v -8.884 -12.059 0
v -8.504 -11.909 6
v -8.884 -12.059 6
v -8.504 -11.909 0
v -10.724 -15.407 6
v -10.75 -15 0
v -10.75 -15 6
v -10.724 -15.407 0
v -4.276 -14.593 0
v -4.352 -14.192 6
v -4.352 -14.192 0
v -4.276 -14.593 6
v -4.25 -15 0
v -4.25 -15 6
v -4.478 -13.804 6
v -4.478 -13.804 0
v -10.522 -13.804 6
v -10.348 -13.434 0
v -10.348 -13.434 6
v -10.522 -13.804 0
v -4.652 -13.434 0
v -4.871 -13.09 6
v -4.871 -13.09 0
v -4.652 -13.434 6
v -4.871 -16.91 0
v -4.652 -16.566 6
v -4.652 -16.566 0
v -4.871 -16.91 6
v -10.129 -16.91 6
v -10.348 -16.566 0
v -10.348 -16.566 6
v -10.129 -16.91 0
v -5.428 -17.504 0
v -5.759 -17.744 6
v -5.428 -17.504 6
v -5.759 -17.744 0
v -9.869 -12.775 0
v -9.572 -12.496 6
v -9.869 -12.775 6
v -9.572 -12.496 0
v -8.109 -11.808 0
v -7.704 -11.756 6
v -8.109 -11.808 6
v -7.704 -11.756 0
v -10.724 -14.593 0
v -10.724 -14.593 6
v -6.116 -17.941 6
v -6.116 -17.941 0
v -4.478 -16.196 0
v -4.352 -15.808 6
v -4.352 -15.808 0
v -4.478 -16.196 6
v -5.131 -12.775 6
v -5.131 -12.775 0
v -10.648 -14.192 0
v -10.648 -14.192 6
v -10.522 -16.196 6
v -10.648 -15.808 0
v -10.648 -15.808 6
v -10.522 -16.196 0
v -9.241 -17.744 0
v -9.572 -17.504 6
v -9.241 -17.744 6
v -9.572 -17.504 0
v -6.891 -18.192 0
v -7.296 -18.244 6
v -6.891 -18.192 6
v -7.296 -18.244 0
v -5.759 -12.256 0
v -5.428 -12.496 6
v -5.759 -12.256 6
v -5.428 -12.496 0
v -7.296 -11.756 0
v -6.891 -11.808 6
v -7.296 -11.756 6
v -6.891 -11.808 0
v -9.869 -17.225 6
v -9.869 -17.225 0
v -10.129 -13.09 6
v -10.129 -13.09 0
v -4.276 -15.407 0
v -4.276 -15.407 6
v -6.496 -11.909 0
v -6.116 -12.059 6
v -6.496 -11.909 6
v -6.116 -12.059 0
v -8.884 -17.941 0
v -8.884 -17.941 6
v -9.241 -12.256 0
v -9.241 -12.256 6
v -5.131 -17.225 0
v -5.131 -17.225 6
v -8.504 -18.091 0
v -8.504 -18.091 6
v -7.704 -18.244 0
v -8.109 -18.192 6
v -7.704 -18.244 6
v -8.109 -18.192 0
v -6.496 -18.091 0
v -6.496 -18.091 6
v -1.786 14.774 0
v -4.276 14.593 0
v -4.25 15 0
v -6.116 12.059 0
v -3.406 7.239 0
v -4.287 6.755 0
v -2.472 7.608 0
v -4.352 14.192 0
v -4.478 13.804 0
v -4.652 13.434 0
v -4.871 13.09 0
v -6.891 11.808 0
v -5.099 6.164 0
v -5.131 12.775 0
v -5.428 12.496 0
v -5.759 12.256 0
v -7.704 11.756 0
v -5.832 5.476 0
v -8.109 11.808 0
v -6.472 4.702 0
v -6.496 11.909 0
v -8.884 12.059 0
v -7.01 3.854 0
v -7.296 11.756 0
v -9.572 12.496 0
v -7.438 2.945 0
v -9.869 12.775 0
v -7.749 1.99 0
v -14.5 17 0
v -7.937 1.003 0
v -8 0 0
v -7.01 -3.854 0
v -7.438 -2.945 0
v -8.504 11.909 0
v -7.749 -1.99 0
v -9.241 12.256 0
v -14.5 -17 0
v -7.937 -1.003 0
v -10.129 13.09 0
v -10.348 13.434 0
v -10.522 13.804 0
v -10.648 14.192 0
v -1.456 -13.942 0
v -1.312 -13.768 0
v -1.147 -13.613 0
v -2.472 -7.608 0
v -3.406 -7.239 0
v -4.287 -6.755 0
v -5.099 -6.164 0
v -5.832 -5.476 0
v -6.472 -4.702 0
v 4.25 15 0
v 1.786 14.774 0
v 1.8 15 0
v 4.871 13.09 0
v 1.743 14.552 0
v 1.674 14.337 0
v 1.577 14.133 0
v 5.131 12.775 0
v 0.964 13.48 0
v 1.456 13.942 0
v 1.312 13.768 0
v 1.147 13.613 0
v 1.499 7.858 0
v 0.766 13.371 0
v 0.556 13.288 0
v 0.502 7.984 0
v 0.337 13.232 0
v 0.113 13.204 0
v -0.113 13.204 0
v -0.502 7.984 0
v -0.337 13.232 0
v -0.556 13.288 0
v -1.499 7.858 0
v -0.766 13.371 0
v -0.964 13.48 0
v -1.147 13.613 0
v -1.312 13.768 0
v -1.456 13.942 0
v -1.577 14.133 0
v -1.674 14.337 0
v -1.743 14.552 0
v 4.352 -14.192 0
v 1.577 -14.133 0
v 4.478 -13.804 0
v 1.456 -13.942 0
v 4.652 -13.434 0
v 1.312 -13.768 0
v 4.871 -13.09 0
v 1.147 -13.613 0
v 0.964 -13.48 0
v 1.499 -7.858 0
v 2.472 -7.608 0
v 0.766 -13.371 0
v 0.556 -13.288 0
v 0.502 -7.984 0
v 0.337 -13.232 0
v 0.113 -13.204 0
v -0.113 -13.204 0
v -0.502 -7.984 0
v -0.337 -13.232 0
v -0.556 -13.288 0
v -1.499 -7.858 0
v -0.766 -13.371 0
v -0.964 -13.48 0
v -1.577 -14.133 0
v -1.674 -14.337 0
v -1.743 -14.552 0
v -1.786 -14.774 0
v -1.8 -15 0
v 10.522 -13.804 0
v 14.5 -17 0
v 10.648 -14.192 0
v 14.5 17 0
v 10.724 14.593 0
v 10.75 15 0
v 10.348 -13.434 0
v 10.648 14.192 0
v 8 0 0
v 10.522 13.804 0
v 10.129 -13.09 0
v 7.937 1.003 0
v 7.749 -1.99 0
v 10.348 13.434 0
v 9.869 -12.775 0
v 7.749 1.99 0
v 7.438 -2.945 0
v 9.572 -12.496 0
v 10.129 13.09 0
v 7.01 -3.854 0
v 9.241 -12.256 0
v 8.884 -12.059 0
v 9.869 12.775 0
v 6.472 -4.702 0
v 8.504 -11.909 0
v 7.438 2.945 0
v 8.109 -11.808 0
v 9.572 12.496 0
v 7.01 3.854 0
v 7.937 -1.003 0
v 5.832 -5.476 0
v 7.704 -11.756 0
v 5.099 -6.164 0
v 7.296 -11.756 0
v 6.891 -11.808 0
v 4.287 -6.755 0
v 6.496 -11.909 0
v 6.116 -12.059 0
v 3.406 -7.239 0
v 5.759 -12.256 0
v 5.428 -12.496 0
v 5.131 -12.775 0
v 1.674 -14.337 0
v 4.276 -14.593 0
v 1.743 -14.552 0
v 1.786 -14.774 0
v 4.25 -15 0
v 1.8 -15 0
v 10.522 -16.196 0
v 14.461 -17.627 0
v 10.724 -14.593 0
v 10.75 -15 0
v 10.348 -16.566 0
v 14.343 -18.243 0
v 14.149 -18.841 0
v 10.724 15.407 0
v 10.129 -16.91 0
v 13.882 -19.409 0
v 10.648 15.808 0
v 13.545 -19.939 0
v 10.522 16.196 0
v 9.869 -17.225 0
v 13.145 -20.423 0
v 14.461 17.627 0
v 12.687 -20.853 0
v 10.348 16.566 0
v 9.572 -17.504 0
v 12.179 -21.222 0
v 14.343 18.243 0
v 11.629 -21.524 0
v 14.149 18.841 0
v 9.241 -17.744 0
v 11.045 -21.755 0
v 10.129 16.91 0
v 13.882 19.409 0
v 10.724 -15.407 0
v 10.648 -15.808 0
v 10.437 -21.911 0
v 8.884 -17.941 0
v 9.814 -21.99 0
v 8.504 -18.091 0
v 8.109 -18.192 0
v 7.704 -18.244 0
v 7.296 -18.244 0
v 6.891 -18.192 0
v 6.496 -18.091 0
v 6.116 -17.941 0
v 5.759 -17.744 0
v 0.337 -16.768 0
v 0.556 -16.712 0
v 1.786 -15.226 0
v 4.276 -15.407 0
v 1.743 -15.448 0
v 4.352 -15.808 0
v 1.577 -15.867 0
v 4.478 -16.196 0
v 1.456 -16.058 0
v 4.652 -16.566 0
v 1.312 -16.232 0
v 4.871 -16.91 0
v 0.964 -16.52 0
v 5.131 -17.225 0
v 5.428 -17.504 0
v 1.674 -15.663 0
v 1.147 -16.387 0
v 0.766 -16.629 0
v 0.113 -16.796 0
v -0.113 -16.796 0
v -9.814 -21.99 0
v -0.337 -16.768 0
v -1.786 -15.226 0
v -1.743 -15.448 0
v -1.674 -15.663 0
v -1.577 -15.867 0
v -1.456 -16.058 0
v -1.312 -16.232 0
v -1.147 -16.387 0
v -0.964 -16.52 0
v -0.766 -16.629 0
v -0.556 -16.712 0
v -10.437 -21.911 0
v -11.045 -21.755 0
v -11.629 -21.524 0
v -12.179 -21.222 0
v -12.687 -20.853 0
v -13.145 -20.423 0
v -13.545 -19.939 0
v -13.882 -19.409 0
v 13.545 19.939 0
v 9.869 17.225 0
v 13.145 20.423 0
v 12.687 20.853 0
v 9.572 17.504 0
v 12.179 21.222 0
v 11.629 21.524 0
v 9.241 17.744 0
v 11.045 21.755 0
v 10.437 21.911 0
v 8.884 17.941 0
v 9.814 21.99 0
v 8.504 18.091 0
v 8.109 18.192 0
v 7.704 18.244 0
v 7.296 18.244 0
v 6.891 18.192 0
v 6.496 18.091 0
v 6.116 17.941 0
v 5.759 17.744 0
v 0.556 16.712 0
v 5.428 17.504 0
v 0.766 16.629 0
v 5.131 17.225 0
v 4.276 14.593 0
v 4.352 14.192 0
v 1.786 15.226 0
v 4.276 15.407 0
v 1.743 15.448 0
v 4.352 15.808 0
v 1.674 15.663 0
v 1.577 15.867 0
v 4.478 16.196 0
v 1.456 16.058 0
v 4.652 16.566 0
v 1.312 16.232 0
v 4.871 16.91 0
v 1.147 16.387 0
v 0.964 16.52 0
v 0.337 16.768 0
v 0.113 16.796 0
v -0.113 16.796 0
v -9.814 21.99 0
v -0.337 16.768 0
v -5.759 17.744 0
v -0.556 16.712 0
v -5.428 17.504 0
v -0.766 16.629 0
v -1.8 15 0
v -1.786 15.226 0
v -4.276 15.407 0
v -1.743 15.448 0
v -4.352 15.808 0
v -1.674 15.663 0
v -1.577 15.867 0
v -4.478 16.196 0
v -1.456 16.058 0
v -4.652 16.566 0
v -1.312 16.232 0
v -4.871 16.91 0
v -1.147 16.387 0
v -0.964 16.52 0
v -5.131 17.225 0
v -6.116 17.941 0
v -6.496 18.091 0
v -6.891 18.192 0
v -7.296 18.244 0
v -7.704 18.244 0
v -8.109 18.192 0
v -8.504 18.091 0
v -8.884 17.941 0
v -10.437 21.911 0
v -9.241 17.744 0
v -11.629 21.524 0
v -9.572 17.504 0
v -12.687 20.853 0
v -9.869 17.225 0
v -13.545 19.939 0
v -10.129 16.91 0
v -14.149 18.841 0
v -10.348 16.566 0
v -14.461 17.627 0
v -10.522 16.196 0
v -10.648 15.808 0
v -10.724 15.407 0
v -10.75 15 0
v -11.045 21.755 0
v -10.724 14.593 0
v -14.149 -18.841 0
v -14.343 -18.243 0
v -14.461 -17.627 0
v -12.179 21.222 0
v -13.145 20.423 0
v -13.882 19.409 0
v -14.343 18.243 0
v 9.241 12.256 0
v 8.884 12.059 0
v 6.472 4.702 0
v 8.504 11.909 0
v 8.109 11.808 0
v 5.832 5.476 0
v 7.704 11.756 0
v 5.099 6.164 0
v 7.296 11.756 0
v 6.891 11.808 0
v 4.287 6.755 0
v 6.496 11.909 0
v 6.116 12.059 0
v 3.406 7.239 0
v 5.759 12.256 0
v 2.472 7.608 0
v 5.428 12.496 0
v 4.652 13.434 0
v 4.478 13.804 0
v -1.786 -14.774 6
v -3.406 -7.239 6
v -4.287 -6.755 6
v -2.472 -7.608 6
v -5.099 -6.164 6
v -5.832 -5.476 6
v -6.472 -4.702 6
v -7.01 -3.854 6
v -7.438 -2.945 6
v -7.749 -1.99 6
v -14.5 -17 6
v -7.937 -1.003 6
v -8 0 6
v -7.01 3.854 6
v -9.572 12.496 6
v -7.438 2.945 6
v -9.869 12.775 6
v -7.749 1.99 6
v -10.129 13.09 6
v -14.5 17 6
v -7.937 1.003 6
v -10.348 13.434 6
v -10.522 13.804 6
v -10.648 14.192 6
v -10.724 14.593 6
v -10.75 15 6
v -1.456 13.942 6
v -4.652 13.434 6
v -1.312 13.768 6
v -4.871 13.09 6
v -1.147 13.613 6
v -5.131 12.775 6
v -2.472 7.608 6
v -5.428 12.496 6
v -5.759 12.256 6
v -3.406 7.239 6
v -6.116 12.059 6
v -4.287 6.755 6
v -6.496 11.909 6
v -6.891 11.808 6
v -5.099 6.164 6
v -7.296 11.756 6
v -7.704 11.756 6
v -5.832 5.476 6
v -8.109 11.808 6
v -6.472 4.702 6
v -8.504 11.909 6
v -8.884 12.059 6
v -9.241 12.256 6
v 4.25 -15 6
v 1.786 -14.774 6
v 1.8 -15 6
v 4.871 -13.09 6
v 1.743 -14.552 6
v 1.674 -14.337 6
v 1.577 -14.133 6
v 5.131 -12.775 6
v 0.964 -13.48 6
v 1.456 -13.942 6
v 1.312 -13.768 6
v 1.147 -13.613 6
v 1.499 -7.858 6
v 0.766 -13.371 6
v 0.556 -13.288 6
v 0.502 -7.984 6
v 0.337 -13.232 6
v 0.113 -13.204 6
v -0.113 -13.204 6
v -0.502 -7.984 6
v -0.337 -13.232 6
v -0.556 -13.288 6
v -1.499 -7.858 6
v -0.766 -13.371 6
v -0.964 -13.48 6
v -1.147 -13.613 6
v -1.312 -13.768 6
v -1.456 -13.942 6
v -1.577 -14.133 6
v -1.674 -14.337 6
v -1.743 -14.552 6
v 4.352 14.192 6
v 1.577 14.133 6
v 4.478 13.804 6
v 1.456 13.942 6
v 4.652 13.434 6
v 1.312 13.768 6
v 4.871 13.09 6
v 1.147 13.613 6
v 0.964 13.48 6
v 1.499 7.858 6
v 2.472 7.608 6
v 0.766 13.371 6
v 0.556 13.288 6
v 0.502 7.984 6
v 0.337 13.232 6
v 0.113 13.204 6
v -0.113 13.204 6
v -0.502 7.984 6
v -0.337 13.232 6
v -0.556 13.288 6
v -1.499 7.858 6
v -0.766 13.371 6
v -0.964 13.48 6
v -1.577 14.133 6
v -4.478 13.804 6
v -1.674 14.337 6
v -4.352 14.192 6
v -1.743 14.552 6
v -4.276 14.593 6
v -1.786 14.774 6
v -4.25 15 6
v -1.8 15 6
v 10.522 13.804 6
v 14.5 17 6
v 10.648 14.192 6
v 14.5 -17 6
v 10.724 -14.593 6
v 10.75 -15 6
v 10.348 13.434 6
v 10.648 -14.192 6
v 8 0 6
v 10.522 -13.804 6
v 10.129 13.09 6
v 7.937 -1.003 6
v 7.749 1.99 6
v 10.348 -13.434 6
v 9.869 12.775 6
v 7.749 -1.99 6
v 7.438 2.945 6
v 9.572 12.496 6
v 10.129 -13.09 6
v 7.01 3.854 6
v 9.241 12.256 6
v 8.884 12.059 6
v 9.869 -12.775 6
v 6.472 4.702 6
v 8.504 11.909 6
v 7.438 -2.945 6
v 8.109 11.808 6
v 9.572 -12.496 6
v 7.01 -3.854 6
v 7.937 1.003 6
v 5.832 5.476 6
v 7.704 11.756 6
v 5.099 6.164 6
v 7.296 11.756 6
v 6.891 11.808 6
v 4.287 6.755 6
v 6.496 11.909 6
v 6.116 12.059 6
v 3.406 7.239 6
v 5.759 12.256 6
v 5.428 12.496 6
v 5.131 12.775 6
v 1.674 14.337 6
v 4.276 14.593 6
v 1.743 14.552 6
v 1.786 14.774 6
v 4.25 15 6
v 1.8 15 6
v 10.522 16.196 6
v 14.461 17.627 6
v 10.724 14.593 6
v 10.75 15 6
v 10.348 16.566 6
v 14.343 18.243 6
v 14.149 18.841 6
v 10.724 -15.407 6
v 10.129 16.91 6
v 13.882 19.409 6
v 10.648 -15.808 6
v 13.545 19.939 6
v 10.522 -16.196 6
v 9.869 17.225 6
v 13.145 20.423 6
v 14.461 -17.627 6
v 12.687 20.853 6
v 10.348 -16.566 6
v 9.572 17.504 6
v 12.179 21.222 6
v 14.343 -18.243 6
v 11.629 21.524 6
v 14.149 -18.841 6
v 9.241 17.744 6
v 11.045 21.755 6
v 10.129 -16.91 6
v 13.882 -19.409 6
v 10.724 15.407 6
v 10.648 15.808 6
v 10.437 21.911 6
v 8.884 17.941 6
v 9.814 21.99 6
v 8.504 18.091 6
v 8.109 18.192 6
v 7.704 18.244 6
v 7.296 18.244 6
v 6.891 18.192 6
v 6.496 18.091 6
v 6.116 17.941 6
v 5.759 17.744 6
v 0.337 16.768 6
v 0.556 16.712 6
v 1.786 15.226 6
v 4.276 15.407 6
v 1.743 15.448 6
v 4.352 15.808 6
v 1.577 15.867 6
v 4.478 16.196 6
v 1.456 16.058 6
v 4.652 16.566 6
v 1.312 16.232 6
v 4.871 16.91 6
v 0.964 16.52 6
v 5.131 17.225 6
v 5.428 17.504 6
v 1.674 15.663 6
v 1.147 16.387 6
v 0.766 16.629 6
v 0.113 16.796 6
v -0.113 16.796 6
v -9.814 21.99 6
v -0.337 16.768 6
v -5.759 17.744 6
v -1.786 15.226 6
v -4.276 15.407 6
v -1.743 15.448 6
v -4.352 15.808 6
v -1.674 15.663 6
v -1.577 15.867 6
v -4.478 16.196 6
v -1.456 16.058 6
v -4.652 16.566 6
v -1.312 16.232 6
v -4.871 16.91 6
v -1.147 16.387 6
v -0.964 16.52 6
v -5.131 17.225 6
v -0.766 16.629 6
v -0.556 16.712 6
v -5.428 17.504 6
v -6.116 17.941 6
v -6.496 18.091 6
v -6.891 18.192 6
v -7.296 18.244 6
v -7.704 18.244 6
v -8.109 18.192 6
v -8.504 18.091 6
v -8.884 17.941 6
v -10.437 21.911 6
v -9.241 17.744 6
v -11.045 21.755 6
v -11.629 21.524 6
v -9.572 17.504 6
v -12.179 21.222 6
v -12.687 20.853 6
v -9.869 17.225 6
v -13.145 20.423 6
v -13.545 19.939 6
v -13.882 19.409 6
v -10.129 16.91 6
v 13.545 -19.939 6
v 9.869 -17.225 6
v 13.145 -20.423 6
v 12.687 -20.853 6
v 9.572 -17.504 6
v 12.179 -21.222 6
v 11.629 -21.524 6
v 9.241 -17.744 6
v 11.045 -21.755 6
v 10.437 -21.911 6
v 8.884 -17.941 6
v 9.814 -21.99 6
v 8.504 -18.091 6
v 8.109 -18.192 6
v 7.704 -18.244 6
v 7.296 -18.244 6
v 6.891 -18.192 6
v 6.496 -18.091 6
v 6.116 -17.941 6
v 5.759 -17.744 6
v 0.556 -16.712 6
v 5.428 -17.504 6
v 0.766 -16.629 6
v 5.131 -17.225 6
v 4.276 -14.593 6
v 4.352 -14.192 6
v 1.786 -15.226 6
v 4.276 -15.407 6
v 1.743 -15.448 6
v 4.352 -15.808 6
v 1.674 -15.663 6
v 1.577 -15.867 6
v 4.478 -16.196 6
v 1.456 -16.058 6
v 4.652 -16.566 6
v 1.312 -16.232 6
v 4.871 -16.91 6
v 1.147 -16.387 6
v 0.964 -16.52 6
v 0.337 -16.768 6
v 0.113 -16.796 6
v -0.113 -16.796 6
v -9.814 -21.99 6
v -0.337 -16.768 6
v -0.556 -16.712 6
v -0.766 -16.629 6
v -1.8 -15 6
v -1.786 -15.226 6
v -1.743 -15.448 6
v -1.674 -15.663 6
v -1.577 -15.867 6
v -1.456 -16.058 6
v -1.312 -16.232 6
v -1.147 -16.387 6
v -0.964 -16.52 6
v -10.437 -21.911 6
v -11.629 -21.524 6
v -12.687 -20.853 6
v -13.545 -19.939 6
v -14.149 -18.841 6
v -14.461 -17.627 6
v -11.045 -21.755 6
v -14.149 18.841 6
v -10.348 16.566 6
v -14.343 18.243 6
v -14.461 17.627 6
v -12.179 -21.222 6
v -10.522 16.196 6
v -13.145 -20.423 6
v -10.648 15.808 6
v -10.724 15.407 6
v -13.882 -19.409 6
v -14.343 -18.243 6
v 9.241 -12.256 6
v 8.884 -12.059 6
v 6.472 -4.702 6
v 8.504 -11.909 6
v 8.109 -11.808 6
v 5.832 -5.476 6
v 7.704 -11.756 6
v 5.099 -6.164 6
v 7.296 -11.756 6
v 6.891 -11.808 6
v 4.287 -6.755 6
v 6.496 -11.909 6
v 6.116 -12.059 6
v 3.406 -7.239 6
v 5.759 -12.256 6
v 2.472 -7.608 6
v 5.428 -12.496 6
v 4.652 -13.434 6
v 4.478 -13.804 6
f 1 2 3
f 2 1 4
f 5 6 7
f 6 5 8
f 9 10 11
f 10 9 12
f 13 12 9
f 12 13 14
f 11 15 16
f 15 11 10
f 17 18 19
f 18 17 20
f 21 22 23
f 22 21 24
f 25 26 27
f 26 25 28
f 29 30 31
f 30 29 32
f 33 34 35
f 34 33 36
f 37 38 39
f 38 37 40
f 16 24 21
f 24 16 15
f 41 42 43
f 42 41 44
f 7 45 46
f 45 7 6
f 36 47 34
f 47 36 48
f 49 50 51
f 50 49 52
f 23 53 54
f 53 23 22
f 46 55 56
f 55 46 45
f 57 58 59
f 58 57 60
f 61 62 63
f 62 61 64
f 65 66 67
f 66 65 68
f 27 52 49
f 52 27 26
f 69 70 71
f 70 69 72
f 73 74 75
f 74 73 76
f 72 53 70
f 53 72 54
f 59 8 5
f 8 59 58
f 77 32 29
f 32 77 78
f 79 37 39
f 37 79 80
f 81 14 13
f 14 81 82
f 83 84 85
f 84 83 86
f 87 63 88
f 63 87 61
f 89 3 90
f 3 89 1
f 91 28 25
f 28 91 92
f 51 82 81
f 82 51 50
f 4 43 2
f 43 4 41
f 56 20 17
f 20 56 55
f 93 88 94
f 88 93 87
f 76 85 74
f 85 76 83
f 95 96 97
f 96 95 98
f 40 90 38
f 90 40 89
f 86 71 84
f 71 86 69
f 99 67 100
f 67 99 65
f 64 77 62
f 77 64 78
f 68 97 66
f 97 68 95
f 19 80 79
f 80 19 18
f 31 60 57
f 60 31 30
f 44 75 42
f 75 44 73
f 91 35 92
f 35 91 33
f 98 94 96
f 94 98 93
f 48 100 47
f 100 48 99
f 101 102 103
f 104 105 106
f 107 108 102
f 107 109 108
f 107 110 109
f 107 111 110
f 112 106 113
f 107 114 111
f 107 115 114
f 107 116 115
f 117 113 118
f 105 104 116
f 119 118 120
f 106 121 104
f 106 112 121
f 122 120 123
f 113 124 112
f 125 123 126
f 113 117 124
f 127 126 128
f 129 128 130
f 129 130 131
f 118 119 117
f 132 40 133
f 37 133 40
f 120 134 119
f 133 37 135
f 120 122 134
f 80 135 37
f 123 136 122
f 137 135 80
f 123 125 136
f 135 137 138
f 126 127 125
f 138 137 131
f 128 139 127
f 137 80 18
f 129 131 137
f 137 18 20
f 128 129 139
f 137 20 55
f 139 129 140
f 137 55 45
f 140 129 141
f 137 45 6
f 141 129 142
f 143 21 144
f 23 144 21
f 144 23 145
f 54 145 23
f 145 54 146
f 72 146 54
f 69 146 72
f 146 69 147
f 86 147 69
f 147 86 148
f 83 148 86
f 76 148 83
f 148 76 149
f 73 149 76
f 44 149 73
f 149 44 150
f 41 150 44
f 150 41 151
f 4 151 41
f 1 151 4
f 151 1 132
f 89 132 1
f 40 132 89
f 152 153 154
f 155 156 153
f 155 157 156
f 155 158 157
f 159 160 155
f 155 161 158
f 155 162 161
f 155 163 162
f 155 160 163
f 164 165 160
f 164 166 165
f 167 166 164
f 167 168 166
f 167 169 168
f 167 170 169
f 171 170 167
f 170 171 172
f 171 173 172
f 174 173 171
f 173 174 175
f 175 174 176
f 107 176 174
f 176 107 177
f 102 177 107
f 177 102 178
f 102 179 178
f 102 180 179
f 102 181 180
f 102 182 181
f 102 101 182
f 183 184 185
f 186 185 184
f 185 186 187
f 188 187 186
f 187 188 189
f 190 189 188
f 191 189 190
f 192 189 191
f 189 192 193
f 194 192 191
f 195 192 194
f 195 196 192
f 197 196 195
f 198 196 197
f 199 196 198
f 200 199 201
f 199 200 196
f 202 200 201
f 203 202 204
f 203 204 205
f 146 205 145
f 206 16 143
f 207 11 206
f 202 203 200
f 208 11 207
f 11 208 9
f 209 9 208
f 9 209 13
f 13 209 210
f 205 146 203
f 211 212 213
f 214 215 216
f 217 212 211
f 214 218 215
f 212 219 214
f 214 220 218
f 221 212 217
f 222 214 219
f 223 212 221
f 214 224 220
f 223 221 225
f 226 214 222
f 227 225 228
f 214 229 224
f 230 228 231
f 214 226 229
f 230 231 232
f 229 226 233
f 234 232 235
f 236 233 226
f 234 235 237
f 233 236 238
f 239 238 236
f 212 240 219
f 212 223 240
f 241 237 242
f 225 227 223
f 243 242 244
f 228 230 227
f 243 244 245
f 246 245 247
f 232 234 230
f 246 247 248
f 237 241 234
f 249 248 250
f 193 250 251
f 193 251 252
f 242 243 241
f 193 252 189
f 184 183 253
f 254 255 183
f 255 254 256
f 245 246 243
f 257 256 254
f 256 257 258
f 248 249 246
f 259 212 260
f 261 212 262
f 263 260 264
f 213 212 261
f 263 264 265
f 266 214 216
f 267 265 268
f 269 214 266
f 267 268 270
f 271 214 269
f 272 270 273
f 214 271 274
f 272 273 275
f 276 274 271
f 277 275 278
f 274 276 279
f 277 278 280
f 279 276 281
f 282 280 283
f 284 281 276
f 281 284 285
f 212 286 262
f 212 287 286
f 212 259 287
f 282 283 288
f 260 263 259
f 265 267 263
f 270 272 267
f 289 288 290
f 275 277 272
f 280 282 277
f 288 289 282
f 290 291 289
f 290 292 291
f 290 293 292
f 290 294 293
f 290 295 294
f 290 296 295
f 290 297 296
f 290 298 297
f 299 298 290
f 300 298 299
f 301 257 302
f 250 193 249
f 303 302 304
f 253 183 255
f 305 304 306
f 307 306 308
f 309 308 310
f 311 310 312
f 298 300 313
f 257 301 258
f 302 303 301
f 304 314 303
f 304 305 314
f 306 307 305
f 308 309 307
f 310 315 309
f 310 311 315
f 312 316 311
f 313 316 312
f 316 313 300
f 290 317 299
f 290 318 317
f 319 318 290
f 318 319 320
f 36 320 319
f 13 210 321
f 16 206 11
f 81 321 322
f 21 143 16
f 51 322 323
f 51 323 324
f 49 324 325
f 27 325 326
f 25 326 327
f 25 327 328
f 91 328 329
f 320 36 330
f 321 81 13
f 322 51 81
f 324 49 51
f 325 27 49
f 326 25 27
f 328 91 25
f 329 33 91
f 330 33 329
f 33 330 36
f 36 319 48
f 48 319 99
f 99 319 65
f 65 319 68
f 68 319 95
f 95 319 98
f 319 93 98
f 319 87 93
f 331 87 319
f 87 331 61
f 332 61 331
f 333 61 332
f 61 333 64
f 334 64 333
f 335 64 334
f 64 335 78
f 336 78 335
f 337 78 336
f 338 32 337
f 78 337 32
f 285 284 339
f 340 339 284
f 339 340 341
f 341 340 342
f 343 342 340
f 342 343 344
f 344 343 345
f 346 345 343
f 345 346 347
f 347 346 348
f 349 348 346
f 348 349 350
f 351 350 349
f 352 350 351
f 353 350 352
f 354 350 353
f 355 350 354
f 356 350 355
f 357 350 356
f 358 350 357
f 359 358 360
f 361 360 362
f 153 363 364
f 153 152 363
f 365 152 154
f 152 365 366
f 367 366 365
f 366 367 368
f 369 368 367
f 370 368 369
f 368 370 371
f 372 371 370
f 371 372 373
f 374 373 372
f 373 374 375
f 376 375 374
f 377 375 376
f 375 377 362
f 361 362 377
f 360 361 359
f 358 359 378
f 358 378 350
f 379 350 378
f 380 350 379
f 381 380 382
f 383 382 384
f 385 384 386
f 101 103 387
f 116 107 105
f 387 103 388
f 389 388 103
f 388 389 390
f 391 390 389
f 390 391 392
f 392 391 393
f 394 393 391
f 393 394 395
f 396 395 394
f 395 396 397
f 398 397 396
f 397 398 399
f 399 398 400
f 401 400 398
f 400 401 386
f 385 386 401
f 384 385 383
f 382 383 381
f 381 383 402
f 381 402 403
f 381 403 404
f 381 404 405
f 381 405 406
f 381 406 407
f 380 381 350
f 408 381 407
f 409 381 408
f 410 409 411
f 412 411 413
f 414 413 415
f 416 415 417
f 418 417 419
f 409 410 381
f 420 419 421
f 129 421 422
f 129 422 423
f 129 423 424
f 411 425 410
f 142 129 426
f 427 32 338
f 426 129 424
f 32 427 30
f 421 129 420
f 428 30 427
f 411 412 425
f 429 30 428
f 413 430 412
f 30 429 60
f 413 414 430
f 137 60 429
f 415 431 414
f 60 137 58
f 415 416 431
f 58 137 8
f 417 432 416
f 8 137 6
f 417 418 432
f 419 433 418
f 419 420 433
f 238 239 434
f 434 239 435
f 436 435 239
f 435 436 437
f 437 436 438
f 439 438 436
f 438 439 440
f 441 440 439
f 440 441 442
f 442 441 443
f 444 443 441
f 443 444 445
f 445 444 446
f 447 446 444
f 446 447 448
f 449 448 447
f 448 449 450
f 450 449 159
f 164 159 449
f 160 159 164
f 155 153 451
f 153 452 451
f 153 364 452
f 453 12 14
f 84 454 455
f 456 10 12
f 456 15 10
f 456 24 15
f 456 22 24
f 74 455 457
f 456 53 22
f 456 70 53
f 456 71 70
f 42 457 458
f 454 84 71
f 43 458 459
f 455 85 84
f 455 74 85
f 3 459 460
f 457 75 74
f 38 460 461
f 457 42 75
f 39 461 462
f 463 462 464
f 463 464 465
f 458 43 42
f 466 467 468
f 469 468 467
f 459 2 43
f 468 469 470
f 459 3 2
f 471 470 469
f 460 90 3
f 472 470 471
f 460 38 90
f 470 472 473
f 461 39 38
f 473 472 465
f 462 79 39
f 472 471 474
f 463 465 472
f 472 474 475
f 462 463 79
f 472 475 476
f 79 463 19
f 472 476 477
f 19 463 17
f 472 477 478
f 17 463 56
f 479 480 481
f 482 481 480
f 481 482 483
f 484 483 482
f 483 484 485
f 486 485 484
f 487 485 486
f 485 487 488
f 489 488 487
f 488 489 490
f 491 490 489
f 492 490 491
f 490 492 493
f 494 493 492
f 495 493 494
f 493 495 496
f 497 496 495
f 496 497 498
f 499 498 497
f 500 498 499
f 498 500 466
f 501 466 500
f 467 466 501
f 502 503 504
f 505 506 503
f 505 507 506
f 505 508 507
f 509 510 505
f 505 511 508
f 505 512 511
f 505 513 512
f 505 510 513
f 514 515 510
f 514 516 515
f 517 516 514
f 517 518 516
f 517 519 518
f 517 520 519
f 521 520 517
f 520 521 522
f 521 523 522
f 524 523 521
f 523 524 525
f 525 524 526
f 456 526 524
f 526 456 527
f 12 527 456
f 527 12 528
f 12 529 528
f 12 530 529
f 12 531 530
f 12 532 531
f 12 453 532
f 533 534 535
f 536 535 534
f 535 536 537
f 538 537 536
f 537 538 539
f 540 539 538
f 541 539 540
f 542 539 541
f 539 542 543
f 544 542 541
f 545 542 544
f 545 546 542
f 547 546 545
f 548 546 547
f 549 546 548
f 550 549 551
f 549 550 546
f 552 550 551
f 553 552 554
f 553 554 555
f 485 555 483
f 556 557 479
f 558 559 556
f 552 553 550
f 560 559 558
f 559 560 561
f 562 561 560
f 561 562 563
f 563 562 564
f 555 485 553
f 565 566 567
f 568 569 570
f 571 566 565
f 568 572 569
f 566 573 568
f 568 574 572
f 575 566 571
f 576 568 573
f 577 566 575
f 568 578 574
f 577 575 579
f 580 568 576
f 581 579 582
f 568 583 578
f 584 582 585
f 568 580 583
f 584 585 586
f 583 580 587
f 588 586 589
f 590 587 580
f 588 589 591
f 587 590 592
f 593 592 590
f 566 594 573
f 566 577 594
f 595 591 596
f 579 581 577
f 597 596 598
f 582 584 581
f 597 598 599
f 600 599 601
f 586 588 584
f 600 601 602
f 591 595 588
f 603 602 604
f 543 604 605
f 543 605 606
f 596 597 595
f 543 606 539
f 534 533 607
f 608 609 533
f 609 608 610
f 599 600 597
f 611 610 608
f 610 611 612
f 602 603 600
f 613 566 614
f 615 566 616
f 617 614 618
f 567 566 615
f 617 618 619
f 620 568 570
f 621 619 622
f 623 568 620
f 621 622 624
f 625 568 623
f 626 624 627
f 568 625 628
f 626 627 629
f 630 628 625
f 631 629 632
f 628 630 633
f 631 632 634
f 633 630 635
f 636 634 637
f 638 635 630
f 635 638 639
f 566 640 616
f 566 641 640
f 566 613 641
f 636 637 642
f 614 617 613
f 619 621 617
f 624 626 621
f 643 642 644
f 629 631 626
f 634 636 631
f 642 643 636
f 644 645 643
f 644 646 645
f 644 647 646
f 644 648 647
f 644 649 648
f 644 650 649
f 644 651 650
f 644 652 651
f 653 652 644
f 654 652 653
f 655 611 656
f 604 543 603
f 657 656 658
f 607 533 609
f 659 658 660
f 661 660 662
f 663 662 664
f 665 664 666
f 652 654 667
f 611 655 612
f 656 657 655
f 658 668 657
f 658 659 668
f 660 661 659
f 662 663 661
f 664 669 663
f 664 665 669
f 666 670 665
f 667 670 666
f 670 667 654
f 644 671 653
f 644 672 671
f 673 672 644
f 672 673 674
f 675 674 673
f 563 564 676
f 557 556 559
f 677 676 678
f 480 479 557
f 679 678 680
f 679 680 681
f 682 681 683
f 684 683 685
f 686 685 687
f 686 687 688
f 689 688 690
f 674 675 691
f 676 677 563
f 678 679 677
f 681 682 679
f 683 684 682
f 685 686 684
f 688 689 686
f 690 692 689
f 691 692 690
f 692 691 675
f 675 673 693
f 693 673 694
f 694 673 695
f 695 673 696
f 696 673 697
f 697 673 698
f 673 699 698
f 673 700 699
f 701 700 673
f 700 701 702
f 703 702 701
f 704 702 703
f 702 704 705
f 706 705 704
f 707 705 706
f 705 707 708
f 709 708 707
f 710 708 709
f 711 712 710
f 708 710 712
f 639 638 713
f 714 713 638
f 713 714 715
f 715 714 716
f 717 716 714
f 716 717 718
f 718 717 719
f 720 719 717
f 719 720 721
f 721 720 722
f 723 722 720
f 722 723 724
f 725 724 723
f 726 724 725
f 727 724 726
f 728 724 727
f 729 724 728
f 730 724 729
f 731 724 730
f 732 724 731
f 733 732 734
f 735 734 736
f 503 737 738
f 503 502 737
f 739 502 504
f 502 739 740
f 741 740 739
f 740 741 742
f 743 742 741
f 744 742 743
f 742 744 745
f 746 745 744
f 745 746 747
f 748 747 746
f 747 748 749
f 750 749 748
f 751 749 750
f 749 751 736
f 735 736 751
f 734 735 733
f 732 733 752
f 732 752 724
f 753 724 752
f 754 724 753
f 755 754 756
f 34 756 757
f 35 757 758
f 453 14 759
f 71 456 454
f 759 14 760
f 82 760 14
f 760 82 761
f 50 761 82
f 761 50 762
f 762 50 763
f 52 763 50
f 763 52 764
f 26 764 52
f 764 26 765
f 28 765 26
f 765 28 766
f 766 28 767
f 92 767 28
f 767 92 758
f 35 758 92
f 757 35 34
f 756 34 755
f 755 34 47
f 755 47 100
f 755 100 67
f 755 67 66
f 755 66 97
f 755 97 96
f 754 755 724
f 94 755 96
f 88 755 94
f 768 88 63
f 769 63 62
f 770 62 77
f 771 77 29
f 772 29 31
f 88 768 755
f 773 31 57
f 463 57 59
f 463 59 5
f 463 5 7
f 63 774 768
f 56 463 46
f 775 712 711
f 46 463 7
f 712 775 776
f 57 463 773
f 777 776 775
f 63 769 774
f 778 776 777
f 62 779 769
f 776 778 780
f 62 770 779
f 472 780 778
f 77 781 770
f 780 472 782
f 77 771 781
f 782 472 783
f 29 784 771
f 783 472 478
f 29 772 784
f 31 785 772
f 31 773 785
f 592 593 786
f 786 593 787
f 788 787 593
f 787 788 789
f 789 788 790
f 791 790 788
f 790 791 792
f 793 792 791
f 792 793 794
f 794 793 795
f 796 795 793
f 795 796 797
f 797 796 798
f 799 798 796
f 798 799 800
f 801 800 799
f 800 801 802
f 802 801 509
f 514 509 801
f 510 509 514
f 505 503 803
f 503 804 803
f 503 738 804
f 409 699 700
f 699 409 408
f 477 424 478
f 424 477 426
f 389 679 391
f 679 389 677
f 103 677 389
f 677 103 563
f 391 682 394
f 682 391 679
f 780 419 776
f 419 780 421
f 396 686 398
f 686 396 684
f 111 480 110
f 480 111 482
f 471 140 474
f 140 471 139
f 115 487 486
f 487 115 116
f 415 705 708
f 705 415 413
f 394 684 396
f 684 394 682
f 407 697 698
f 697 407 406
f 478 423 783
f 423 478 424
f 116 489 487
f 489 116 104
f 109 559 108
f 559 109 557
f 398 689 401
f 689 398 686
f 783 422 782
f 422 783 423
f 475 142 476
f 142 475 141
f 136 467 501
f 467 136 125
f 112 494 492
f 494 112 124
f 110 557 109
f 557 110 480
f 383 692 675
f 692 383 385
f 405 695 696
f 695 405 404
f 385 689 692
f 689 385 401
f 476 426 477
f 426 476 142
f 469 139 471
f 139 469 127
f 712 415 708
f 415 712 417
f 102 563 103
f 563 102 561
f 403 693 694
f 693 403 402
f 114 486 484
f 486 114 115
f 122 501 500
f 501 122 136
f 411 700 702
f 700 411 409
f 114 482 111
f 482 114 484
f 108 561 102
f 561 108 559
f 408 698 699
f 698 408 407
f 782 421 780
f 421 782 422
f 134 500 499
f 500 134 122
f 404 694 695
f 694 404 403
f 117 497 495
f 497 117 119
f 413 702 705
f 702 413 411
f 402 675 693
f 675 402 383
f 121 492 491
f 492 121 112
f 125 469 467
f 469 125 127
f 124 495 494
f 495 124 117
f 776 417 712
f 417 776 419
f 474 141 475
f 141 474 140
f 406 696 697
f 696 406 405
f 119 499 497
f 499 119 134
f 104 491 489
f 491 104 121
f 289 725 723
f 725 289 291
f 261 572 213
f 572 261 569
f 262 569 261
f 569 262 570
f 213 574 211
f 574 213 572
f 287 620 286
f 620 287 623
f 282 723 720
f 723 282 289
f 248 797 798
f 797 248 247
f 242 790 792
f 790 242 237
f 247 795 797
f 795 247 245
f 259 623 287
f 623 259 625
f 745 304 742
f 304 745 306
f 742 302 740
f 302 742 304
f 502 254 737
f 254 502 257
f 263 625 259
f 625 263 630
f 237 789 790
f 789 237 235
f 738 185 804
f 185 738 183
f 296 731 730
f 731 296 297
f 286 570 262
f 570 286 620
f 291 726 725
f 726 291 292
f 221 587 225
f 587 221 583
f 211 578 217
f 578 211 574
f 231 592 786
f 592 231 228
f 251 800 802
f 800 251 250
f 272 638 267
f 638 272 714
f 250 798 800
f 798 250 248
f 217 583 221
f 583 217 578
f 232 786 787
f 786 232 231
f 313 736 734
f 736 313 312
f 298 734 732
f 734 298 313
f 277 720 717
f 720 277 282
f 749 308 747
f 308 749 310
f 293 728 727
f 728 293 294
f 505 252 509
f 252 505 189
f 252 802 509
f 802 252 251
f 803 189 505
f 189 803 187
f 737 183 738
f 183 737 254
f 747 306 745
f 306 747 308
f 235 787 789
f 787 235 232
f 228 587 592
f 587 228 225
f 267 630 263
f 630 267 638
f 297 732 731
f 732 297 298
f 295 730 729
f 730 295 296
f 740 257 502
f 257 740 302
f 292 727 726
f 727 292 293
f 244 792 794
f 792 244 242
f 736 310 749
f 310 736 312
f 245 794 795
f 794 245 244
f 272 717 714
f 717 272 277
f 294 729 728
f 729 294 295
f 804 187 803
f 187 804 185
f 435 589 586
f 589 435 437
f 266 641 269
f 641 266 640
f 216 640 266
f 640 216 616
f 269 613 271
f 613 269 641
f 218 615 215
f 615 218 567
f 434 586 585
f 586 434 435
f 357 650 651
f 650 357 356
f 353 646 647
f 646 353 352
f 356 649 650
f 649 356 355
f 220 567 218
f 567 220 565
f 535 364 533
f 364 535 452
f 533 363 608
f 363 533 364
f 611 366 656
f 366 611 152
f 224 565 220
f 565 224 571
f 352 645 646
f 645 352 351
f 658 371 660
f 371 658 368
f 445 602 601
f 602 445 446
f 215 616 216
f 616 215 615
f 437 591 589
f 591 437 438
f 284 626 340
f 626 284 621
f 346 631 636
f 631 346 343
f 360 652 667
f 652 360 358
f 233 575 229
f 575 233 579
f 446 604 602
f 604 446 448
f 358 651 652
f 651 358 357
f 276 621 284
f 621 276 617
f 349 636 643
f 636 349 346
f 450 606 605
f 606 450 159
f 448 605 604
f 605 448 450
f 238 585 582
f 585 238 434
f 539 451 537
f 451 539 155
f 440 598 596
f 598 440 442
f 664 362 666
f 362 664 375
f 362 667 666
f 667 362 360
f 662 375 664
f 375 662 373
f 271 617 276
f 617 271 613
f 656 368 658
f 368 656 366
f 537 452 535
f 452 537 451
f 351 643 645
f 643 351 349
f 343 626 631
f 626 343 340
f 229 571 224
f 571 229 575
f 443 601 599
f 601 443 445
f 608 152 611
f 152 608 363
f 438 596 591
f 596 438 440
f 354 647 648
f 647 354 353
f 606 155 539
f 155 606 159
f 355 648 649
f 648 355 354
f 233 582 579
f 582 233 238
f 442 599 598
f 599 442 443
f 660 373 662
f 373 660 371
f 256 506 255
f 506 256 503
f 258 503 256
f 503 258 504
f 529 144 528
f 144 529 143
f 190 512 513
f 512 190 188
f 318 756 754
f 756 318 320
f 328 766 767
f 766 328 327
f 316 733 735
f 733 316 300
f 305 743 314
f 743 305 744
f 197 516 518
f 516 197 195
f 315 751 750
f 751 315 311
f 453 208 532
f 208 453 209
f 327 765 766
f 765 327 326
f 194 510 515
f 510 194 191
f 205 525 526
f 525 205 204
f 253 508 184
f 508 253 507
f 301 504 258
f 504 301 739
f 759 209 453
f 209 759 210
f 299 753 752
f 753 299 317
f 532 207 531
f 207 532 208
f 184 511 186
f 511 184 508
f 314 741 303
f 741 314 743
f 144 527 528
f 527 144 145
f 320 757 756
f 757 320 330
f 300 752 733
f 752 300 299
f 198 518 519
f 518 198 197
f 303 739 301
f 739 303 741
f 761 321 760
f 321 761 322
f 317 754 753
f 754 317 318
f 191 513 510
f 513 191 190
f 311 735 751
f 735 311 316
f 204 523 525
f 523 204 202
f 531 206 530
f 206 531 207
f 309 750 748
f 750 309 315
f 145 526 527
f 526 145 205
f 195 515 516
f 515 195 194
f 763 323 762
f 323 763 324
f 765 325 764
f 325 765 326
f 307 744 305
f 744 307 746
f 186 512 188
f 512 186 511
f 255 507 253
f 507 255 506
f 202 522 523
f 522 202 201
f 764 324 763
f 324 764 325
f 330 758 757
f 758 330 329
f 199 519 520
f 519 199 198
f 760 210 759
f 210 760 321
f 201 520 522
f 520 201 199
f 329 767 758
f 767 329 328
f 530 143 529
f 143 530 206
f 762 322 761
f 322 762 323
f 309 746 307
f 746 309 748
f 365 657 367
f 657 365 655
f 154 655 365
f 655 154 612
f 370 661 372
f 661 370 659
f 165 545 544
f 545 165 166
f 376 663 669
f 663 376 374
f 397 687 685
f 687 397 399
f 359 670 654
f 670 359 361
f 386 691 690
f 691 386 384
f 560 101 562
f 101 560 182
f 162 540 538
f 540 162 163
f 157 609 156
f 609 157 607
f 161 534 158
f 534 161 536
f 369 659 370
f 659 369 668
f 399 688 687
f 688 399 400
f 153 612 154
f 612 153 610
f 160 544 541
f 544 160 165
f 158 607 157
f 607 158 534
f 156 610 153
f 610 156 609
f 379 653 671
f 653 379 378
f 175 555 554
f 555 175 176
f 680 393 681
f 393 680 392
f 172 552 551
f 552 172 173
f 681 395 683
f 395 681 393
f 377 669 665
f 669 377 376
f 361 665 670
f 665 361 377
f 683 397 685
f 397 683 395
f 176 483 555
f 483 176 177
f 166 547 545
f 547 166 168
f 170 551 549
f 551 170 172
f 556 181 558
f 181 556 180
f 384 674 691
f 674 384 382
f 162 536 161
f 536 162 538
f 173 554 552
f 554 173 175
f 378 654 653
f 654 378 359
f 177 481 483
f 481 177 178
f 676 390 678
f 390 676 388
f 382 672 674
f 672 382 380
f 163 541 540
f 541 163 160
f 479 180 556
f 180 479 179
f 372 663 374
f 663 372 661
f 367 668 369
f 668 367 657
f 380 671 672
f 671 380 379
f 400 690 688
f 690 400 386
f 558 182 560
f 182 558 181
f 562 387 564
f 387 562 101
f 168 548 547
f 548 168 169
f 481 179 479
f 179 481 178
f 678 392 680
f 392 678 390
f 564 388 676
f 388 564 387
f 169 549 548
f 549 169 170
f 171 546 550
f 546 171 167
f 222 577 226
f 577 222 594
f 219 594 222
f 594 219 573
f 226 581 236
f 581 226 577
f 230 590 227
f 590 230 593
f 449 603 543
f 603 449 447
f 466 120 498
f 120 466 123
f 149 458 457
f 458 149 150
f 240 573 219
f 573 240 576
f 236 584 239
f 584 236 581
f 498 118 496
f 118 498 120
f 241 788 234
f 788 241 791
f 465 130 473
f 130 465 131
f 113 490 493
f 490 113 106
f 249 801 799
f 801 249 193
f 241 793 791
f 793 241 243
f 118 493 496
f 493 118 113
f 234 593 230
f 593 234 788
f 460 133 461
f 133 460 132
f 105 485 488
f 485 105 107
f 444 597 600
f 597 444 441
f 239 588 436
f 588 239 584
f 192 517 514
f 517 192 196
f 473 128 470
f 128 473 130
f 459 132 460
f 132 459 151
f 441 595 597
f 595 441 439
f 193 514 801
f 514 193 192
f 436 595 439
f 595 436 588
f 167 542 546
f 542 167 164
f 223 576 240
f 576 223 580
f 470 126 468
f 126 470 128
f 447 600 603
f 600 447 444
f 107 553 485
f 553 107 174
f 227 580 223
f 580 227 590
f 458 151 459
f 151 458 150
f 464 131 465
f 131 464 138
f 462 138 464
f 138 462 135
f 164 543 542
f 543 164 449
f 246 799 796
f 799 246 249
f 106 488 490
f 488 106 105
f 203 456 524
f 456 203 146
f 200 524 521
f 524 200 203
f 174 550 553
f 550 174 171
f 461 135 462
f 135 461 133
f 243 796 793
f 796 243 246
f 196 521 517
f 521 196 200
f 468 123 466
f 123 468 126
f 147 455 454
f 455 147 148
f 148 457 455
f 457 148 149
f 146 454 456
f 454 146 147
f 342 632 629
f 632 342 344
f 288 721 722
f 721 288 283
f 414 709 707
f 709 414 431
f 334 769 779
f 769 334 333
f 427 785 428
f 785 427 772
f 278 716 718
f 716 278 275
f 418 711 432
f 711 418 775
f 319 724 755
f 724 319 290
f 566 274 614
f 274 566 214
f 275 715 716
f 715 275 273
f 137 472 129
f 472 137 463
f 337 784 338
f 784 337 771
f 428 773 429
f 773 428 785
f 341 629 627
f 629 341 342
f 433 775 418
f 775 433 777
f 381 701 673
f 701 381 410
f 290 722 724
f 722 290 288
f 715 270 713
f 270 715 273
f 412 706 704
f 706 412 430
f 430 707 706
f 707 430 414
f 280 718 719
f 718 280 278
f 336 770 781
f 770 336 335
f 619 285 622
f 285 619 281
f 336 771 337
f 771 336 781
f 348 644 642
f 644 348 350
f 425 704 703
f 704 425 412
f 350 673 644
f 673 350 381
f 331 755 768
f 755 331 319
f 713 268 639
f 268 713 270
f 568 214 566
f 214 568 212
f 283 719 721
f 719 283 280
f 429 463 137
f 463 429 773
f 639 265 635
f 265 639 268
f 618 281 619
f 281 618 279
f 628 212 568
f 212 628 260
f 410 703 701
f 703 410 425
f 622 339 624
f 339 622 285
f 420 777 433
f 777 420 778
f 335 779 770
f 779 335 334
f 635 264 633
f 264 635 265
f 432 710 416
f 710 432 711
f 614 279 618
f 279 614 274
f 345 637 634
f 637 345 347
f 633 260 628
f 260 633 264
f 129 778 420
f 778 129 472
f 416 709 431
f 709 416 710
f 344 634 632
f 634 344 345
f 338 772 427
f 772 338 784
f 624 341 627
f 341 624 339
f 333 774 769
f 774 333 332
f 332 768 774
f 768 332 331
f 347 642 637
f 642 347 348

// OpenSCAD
$fn = 50;

difference() {
	union() {
		hull() {
			translate(v = [-9.5, 17.0, 0]) {
				cylinder(h = 6, r = 5);
			}
			translate(v = [9.5, 17.0, 0]) {
				cylinder(h = 6, r = 5);
			}
			translate(v = [-9.5, -17.0, 0]) {
				cylinder(h = 6, r = 5);
			}
			translate(v = [9.5, -17.0, 0]) {
				cylinder(h = 6, r = 5);
			}
		}
	}
	union() {
		translate(v = [-7.5, -15.0, 0]) {
			cylinder(h = 6, r = 3.25);
		}
		translate(v = [-7.5, 15.0, 0]) {
			cylinder(h = 6, r = 3.25);
		}
		translate(v = [7.5, -15.0, 0]) {
			cylinder(h = 6, r = 3.25);
		}
		translate(v = [7.5, 15.0, 0]) {
			cylinder(h = 6, r = 3.25);
		}
		translate(v = [0.0, -15.0, 0]) {
			cylinder(h = 6, r = 1.8);
		}
		translate(v = [0.0, 15.0, 0]) {
			cylinder(h = 6, r = 1.8);
		}
		cylinder(h = 6, r = 8.0);
	}
}
